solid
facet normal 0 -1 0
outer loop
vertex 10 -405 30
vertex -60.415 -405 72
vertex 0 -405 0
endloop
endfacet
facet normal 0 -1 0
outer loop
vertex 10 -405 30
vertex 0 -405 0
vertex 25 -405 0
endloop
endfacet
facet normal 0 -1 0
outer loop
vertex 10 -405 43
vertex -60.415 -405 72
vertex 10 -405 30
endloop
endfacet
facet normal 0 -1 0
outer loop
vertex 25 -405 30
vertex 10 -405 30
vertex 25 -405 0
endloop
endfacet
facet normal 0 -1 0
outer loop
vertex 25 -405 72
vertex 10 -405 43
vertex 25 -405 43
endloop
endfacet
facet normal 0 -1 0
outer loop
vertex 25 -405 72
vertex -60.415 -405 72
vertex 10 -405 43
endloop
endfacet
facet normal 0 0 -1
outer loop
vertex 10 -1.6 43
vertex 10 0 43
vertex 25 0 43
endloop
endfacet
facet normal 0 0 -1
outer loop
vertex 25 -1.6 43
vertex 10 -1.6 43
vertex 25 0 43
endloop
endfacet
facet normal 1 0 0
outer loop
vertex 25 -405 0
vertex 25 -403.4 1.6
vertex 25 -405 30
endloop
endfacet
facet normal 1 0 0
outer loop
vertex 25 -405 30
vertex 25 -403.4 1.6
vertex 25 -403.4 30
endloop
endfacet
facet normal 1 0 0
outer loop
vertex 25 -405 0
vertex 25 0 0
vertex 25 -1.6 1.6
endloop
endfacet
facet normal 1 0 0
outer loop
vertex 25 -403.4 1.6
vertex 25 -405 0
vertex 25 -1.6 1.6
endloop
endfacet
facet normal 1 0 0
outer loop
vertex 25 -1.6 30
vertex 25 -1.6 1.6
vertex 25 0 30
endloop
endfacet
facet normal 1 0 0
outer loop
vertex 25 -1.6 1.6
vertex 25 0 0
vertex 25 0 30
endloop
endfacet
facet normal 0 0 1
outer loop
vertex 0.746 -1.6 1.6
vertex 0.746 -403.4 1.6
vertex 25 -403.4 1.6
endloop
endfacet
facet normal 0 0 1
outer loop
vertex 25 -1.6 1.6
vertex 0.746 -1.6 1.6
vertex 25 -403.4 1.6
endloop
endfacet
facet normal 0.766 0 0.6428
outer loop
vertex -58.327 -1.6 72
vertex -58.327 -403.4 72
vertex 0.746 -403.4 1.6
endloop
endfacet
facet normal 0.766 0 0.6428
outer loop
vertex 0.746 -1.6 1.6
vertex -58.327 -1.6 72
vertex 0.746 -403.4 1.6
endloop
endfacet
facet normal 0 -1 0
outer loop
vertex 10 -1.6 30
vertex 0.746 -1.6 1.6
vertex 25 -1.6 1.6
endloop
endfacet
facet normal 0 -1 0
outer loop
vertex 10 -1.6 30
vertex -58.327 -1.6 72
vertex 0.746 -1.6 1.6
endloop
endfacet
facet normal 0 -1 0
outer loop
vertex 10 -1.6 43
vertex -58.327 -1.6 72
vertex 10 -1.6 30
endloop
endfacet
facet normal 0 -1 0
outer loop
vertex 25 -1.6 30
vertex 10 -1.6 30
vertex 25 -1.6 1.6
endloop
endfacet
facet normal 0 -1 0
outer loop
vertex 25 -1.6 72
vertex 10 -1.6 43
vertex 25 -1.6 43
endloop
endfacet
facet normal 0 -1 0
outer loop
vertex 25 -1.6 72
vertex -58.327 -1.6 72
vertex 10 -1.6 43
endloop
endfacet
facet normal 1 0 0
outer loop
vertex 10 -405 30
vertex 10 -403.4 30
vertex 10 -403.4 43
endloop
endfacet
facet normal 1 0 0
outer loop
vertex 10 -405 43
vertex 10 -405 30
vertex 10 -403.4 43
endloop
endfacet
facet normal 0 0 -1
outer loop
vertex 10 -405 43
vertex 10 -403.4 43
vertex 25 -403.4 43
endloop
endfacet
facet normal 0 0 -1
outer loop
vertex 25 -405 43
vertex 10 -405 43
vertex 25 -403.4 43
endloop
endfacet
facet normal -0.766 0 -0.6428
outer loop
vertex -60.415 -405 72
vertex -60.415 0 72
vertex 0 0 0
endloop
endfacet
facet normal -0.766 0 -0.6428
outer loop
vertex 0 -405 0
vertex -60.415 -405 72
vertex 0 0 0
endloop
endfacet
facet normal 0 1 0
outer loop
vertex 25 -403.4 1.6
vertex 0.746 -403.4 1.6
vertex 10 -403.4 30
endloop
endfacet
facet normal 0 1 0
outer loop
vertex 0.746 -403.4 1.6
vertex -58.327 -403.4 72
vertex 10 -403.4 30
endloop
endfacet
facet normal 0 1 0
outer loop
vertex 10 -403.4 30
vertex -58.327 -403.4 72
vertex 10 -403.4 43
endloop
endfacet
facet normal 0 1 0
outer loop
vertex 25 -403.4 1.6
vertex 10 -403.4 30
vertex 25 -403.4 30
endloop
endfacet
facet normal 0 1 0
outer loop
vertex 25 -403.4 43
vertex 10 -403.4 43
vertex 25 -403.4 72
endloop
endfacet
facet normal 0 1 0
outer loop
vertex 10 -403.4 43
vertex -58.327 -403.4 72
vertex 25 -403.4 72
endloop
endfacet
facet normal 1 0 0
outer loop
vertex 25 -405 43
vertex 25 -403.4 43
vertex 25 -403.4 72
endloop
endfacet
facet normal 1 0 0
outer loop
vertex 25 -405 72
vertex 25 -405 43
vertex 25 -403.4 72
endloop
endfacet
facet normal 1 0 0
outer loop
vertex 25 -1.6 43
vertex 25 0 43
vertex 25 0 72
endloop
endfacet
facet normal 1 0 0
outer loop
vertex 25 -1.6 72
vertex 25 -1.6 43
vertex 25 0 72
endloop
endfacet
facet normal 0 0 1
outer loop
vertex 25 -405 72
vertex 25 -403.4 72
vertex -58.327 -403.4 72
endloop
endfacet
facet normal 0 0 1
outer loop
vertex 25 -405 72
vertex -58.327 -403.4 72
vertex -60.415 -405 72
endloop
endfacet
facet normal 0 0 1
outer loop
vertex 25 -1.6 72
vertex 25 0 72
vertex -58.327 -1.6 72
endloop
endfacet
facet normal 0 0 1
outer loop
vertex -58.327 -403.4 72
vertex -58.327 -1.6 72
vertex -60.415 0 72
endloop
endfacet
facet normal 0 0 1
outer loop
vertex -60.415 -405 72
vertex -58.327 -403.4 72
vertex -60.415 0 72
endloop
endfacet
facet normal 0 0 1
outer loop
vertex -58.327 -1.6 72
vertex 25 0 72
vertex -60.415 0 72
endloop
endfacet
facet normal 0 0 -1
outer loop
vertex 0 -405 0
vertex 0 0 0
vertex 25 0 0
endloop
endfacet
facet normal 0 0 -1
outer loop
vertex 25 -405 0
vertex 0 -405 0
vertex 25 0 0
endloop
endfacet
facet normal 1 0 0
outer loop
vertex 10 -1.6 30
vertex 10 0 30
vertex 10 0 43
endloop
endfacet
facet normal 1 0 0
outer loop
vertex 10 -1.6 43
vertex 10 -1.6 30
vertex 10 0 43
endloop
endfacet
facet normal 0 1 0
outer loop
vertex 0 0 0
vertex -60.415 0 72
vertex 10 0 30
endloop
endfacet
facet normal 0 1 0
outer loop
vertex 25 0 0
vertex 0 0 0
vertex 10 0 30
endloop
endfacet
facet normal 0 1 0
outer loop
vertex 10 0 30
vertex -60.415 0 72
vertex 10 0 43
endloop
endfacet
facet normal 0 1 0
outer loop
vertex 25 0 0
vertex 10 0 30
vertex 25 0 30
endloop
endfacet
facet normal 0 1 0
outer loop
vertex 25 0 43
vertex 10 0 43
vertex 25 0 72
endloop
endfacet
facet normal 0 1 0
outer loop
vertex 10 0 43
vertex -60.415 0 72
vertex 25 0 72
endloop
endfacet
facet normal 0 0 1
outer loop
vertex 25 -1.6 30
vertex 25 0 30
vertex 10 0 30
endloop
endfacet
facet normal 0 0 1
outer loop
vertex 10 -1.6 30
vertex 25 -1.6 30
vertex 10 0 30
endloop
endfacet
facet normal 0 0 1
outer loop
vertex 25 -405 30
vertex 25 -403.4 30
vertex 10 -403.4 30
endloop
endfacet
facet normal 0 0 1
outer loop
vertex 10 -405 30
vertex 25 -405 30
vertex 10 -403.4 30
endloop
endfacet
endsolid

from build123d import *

# Parameters (mm, degrees)
F1_DEPTH = 405
F4_DEPTH = 401.8


with BuildPart() as f1:
    # F0 (on Front) → F1 (new body)
    with BuildSketch(Plane.XZ):
        Polygon((-60.4151734448, 72), (0, 0), (25, 0), (25, 30), (10, 30), (10, 43), (25, 43), (25, 72), align=None)
    extrude(amount=F1_DEPTH)

    # F3 (on offset) → F4 (cut)
    with BuildSketch(Plane.XZ.offset(403.4)):
        Polygon((29.3578643668, 73.0284601755), (-59.1895023358, 73.0284601755), (0.746092253, 1.6), (25, 1.6), align=None)
    extrude(amount=-F4_DEPTH, mode=Mode.SUBTRACT)


solid = f1.part
